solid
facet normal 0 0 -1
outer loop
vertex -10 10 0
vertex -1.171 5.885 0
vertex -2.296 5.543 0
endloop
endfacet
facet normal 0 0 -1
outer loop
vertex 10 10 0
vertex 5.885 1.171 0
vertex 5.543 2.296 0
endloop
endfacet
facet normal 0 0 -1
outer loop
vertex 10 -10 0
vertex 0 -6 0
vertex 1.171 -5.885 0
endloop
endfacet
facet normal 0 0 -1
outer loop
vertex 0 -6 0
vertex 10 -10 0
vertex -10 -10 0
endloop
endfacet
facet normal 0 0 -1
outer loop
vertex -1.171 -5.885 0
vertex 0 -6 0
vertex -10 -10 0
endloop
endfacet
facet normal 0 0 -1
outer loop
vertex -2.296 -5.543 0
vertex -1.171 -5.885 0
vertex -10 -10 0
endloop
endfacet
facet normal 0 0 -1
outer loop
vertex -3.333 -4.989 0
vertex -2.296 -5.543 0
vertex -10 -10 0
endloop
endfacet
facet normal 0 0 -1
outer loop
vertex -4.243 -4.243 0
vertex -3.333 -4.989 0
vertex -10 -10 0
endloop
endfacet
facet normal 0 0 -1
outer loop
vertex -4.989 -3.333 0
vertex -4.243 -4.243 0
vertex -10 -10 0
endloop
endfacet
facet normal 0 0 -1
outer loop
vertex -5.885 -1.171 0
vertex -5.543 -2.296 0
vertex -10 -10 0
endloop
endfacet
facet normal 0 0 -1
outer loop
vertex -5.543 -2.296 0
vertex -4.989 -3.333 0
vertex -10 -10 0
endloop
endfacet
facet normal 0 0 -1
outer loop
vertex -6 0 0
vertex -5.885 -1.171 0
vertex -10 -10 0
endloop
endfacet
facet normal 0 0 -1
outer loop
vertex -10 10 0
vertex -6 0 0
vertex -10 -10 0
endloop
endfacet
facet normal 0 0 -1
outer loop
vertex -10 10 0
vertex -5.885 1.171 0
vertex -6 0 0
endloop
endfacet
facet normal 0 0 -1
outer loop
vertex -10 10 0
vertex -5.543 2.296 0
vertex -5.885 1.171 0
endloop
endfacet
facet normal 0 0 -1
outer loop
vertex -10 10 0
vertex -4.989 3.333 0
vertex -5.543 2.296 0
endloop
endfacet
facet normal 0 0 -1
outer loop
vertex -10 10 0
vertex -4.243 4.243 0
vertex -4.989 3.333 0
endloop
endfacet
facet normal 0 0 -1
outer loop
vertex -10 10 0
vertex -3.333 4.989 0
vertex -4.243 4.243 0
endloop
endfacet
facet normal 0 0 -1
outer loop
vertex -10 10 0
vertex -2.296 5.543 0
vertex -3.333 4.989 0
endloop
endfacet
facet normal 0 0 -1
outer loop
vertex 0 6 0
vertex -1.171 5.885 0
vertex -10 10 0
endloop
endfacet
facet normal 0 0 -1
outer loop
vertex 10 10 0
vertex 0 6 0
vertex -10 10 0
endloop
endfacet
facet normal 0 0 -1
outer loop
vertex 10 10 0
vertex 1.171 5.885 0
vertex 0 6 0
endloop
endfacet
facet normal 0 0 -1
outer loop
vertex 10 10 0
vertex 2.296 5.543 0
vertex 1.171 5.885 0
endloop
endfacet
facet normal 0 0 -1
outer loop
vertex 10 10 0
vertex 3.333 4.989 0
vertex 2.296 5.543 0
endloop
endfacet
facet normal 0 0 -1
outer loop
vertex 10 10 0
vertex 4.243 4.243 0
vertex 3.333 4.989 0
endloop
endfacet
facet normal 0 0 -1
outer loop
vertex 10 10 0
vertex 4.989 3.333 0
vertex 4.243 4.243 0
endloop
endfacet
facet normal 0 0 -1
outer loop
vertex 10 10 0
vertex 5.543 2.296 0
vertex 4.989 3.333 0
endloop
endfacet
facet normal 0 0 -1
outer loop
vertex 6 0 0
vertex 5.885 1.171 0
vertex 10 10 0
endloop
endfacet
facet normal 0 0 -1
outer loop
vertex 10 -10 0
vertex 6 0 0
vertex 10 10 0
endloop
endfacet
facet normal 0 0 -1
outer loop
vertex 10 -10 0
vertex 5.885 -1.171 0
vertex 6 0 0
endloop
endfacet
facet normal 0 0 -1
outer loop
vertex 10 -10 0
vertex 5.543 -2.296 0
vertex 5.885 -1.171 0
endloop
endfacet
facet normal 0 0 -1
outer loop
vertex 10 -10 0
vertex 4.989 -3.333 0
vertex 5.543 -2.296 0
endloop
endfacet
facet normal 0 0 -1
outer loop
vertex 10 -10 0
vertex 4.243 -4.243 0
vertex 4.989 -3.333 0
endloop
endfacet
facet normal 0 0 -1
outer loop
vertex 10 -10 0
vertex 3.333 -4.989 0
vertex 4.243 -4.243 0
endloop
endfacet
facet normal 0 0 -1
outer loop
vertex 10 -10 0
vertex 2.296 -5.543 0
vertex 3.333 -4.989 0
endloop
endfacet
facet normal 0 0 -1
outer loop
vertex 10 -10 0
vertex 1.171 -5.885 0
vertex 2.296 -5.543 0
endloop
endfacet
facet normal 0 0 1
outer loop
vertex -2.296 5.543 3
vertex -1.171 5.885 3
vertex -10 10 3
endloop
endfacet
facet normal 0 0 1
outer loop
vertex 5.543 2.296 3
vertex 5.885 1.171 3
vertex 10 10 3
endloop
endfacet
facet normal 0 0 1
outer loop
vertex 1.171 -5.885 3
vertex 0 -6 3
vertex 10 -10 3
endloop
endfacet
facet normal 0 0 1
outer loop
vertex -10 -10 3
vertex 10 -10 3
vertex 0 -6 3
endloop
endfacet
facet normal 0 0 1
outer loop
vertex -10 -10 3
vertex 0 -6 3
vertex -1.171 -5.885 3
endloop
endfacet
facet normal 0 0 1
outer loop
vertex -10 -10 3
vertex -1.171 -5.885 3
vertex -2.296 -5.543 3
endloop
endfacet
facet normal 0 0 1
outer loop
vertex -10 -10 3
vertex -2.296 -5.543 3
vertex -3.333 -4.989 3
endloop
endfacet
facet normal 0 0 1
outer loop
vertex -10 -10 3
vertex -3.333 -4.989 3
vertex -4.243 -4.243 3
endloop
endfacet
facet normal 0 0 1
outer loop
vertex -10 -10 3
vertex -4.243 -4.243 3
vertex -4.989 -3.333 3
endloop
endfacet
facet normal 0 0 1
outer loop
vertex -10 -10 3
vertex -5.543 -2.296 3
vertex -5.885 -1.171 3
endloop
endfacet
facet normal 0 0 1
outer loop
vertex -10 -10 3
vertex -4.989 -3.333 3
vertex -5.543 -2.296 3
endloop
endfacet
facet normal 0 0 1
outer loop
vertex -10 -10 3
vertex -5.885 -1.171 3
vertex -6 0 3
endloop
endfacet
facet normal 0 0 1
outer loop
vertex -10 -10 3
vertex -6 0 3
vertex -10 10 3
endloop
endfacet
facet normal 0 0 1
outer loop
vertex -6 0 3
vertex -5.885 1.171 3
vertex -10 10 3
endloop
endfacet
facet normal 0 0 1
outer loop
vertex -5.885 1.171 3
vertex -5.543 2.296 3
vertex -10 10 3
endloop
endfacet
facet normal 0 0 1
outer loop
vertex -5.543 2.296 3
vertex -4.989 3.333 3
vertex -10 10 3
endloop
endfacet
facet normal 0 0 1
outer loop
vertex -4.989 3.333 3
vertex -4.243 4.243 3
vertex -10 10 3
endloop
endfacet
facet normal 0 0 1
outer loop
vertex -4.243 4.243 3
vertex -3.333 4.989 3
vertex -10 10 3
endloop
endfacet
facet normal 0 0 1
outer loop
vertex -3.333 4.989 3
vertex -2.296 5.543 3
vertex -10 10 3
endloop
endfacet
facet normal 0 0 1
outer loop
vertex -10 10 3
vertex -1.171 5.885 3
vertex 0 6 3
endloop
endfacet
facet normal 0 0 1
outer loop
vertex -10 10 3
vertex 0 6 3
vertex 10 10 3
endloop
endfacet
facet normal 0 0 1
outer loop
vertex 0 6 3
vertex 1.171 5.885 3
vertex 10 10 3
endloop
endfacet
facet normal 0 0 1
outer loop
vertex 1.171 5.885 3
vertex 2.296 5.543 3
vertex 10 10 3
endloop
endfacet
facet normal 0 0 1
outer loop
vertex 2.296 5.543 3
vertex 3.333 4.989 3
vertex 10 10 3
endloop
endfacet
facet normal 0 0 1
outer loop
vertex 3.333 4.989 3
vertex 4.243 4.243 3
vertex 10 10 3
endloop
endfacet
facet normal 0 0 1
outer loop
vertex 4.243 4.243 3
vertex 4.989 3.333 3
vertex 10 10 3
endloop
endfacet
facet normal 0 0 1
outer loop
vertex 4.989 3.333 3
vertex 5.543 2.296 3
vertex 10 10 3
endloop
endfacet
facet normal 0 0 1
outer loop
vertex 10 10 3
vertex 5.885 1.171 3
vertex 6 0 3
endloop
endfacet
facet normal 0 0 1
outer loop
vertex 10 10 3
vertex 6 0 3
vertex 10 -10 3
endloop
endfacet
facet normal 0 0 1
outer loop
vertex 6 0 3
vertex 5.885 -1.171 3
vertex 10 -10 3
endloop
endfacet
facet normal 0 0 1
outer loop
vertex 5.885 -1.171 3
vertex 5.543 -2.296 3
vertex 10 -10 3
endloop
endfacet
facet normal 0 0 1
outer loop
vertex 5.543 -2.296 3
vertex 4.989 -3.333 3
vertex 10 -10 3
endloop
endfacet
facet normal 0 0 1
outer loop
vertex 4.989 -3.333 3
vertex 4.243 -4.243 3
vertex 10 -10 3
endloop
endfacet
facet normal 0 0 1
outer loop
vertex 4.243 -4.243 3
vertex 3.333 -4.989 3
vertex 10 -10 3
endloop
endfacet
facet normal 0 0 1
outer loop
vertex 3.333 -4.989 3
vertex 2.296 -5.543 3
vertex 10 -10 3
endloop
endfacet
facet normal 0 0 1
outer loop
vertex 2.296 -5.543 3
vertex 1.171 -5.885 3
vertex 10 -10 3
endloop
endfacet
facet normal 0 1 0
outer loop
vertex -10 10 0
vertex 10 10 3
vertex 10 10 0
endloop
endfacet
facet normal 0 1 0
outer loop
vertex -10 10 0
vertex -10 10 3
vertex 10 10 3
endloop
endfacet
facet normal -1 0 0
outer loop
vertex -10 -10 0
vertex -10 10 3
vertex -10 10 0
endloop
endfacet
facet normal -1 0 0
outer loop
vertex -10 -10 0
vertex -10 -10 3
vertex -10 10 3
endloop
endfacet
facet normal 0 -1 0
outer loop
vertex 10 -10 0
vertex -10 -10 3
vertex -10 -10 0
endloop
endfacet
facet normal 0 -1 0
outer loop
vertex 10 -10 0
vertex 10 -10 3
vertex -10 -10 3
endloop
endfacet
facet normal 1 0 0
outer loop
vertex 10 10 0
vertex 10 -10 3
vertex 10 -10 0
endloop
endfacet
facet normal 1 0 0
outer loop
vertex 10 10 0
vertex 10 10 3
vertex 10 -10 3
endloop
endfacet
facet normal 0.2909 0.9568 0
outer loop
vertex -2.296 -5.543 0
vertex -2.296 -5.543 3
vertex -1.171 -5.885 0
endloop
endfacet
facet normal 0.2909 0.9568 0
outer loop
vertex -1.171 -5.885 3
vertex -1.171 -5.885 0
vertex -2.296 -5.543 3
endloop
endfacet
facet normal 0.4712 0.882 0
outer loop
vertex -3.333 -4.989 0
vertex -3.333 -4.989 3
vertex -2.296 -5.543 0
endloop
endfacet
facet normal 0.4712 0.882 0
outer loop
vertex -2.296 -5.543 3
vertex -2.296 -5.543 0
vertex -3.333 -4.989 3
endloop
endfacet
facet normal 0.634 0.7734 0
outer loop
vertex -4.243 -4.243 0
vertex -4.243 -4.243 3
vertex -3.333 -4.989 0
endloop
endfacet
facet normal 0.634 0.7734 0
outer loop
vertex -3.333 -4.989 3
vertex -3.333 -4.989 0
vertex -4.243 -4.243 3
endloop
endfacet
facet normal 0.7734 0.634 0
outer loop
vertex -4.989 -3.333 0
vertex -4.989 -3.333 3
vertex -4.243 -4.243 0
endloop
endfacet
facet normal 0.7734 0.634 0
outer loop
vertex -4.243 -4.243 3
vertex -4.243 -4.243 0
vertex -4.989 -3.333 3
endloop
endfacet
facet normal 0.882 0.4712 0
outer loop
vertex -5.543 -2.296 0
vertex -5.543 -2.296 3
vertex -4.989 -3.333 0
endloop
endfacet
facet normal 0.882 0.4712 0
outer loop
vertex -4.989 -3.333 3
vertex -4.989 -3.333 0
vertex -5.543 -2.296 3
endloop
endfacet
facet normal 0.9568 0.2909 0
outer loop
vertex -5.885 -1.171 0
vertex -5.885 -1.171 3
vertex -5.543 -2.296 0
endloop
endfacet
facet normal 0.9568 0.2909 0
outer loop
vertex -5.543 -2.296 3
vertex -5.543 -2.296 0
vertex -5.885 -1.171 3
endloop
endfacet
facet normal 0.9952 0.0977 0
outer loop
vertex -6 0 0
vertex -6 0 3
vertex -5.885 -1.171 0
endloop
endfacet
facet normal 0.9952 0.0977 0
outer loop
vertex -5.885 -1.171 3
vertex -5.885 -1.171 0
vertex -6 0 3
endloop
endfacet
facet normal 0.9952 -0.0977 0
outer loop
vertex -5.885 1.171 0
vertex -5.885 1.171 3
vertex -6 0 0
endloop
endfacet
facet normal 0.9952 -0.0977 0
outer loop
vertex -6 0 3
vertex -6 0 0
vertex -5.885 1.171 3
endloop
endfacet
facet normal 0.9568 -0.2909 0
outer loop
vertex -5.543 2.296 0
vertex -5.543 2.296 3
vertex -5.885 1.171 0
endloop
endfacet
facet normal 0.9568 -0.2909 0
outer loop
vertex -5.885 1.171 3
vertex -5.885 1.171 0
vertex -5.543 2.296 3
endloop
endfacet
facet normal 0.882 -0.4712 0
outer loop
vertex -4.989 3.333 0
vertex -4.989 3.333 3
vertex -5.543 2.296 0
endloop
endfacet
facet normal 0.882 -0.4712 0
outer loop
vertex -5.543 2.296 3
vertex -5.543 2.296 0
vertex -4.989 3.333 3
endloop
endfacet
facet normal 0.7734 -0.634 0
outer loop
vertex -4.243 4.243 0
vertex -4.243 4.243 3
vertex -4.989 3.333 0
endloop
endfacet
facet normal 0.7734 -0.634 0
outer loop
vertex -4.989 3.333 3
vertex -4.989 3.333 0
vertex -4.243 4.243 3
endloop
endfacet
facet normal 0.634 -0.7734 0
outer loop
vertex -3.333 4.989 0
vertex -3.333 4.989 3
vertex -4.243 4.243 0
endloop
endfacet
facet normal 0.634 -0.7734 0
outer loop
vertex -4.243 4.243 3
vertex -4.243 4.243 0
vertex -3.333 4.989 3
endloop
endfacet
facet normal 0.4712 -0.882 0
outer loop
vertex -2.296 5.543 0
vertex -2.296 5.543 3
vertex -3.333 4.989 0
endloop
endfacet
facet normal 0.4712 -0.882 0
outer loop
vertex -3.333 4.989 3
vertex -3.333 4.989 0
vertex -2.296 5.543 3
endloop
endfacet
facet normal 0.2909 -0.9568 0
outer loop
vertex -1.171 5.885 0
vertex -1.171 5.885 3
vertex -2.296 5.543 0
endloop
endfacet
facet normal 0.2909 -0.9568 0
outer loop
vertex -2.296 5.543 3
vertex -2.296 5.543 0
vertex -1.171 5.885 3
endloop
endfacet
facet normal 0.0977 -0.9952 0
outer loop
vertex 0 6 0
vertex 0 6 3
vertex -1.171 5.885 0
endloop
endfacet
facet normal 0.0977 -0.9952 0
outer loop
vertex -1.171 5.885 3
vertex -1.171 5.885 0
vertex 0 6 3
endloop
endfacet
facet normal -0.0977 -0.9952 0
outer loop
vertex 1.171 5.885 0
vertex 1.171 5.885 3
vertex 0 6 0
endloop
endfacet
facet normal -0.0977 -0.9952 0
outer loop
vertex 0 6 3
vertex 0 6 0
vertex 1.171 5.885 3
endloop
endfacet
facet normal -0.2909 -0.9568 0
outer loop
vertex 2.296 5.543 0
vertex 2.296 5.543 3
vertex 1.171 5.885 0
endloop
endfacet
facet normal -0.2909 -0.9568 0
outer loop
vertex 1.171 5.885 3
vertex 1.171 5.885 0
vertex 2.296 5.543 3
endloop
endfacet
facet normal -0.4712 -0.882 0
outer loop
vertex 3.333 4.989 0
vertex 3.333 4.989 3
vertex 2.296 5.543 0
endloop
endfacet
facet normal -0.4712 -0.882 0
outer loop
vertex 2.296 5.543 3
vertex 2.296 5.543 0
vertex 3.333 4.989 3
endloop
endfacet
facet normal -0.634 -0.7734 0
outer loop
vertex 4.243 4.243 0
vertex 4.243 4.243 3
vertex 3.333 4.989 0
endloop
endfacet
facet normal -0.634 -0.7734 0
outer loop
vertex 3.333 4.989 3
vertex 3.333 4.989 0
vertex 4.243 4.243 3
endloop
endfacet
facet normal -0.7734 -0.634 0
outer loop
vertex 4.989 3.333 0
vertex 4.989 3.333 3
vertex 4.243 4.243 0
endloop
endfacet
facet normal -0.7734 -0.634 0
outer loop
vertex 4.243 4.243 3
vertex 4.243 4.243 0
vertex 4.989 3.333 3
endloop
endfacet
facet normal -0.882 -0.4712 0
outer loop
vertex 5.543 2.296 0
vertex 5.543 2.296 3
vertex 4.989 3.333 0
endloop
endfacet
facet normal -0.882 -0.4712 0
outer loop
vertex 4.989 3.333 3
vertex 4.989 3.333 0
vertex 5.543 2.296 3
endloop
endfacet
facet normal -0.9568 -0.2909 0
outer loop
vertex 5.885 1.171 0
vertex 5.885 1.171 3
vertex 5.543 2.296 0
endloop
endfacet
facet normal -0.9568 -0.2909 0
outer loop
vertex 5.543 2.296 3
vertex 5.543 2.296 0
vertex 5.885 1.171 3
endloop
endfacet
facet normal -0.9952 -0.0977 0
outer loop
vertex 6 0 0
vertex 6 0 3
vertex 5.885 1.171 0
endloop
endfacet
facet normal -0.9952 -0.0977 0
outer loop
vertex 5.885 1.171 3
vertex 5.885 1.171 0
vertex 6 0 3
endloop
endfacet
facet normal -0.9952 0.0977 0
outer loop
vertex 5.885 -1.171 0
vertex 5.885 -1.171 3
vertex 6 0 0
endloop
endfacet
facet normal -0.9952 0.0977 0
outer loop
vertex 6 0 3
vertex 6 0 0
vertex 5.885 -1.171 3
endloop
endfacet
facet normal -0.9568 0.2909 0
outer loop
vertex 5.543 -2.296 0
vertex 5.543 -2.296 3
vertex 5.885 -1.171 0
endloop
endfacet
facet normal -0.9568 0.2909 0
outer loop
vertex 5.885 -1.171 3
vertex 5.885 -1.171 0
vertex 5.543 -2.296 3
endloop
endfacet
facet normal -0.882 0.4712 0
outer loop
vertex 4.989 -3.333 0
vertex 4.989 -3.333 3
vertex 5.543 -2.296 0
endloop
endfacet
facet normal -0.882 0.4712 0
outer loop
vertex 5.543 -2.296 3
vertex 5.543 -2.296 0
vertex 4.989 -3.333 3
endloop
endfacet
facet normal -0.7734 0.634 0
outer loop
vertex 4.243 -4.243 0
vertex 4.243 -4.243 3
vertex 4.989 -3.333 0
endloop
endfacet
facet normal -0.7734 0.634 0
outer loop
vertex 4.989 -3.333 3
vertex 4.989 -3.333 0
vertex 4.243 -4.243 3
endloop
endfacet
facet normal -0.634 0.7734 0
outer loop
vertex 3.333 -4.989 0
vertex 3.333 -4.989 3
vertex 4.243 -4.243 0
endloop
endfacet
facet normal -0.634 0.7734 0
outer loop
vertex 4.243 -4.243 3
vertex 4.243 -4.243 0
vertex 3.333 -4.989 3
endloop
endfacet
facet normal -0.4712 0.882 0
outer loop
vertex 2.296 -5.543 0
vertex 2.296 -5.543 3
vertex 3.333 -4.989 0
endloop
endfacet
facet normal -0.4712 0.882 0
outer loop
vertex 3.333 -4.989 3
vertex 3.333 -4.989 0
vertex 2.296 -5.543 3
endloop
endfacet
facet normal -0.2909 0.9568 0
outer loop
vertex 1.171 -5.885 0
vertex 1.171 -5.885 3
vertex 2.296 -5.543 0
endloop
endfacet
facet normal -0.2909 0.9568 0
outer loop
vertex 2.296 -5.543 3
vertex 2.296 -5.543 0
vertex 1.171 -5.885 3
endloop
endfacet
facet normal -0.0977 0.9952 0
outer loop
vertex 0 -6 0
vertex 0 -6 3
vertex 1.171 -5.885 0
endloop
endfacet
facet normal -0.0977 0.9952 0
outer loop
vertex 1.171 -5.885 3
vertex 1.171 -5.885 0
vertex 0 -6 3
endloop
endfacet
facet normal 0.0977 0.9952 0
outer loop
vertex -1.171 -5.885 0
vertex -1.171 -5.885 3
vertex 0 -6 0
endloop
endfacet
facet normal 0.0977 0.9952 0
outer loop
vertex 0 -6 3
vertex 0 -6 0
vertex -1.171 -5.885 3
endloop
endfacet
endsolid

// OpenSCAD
linear_extrude(3) difference(){ square(20, center=true); circle(6, $fn=32); }
